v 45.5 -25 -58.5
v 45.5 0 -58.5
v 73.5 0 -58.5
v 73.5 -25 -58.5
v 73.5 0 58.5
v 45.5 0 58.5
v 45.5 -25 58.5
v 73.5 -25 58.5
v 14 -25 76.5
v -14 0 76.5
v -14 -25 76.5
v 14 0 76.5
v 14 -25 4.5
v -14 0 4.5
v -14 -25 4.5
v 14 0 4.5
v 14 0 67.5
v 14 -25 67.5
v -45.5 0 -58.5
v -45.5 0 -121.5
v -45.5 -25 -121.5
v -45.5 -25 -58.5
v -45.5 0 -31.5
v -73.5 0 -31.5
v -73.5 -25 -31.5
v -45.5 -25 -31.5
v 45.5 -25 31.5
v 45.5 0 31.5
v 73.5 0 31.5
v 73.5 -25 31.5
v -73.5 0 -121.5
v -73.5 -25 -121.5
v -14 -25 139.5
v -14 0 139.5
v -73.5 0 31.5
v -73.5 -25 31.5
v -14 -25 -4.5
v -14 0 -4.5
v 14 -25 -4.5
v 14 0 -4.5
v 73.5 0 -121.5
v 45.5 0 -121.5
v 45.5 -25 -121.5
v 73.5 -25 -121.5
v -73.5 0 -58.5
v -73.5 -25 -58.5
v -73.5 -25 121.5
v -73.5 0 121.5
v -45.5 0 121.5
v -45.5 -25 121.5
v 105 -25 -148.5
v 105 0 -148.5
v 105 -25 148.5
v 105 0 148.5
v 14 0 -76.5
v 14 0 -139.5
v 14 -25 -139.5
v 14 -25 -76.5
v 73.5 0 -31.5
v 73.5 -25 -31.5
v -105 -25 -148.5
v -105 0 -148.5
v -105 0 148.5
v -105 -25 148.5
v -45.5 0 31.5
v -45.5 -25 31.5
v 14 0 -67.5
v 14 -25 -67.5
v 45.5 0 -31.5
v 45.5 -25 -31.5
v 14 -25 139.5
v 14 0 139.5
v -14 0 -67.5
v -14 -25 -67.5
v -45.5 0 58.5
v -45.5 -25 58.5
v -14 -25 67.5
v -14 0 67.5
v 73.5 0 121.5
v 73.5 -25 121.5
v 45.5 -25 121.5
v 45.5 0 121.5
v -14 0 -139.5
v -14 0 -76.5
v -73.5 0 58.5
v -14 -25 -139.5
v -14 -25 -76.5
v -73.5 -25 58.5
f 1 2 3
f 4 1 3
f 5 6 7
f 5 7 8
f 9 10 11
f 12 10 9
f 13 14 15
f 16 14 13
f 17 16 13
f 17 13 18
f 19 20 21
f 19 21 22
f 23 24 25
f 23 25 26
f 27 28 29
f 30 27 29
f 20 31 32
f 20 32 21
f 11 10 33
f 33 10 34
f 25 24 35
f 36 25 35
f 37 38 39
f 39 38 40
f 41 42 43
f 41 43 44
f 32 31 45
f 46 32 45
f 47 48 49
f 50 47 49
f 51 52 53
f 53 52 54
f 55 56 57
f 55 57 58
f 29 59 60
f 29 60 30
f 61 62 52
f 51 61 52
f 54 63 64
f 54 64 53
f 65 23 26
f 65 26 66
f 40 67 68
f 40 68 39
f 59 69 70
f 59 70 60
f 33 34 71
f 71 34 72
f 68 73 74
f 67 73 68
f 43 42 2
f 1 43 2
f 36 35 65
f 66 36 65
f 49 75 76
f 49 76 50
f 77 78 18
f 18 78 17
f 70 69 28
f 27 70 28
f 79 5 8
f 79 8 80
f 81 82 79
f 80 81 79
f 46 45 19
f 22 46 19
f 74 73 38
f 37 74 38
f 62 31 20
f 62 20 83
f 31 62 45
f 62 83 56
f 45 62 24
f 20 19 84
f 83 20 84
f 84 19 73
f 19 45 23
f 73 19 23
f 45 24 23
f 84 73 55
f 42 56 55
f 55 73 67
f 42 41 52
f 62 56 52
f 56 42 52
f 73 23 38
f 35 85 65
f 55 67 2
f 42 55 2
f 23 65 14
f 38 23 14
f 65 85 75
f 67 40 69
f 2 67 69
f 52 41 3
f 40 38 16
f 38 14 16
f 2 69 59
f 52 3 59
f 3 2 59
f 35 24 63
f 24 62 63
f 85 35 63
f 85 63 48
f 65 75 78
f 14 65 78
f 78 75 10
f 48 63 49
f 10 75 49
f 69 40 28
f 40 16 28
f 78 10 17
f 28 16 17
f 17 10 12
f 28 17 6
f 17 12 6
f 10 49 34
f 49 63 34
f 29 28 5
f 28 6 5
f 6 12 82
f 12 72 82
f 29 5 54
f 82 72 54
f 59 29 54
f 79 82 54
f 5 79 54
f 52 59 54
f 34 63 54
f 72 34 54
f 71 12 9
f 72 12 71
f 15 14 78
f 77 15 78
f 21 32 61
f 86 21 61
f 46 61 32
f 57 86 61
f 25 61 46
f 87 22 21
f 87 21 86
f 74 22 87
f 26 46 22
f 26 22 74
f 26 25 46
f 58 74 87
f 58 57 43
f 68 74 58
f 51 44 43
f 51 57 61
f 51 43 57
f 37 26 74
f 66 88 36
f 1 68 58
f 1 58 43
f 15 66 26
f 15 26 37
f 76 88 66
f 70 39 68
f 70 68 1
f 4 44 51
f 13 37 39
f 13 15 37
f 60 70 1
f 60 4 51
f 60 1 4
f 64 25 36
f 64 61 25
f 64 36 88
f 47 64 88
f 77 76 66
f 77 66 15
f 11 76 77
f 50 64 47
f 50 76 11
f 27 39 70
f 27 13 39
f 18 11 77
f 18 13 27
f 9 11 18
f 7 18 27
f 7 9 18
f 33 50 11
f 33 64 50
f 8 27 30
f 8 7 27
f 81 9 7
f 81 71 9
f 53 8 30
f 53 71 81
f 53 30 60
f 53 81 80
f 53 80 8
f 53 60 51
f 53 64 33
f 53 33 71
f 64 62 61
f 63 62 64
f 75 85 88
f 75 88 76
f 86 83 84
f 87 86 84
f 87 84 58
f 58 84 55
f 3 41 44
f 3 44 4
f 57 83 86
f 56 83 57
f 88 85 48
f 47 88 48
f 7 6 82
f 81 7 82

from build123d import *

# Parameters (mm, degrees)
F0_W     = 210
F0_H     = 297
F0_W_2   = 28
F0_H_2   = 63
F1_DEPTH = 25


with BuildPart() as f1:
    # F0 (on Front) → F1 (new body)
    with BuildSketch(Plane.XZ):
        Rectangle(F0_W, F0_H)
        with Locations((-59.5, -90)):
            Rectangle(F0_W_2, F0_H_2, mode=Mode.SUBTRACT)
        with Locations((0, -108)):
            Rectangle(F0_W_2, F0_H_2, mode=Mode.SUBTRACT)
        with Locations((59.5, -90)):
            Rectangle(F0_W_2, F0_H_2, mode=Mode.SUBTRACT)
        with Locations((0, -36)):
            Rectangle(F0_W_2, F0_H_2, mode=Mode.SUBTRACT)
        with Locations((-59.5, 0)):
            Rectangle(F0_W_2, F0_H_2, mode=Mode.SUBTRACT)
        with Locations((-59.5, 90)):
            Rectangle(F0_W_2, F0_H_2, mode=Mode.SUBTRACT)
        with Locations((0, 36)):
            Rectangle(F0_W_2, F0_H_2, mode=Mode.SUBTRACT)
        with Locations((59.5, 0)):
            Rectangle(F0_W_2, F0_H_2, mode=Mode.SUBTRACT)
        with Locations((0, 108)):
            Rectangle(F0_W_2, F0_H_2, mode=Mode.SUBTRACT)
        with Locations((59.5, 90)):
            Rectangle(F0_W_2, F0_H_2, mode=Mode.SUBTRACT)
    extrude(amount=F1_DEPTH)


solid = f1.part
